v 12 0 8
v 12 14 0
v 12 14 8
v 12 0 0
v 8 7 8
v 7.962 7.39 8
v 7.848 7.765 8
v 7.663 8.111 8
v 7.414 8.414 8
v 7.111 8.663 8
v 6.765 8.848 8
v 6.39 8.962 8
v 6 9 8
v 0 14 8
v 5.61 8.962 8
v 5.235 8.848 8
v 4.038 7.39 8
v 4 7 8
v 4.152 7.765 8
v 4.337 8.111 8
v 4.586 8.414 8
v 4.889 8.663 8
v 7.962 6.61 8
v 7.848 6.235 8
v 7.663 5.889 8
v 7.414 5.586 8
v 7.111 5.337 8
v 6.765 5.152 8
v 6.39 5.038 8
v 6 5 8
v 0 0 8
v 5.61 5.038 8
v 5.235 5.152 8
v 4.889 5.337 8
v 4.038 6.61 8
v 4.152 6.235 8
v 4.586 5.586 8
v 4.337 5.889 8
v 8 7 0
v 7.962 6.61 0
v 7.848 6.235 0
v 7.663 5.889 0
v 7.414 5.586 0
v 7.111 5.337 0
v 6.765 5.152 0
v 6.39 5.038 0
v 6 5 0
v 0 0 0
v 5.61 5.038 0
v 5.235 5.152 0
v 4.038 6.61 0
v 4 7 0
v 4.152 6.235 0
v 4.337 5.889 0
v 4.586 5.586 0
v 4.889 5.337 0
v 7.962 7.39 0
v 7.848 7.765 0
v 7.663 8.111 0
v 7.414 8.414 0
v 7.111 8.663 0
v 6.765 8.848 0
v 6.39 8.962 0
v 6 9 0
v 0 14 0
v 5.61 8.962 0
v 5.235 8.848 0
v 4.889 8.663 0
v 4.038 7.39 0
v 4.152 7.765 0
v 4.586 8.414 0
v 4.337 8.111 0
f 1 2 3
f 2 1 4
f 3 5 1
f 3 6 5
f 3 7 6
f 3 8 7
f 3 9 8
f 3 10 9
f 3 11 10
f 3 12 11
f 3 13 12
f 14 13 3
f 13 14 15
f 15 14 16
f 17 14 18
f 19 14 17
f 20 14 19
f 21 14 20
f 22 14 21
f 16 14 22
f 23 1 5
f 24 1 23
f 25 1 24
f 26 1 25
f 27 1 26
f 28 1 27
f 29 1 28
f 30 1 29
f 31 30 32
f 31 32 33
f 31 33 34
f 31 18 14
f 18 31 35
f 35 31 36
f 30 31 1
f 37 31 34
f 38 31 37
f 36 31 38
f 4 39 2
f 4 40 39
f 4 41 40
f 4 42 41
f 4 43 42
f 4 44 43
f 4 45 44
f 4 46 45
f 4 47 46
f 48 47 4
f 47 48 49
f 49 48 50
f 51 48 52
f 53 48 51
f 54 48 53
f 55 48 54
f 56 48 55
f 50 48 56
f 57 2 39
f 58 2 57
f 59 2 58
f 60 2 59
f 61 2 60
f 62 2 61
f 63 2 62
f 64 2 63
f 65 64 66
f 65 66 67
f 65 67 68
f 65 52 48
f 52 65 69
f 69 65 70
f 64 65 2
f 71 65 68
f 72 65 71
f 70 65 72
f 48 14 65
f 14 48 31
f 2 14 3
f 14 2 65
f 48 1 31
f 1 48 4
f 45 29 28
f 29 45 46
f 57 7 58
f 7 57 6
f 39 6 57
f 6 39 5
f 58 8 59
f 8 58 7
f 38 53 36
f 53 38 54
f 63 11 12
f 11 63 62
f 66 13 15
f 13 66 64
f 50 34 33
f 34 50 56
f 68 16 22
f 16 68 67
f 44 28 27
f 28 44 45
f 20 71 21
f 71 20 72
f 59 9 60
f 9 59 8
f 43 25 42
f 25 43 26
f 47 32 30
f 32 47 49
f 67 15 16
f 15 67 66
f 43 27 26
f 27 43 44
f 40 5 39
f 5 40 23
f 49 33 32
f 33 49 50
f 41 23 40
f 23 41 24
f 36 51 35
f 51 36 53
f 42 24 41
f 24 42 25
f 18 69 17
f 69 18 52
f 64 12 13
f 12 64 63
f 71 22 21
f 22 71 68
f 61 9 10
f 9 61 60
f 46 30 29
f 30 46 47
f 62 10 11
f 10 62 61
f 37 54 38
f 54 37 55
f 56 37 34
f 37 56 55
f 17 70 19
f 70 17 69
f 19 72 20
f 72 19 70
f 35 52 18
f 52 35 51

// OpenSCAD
$fn = 32;

// ----------------------------------------------------------------------
// Micro pad: drilled pad, 5-20 mm class
// ----------------------------------------------------------------------

// --- parameters (mm) ---
pad_l = 12;               // pad length, X
pad_w = 14;               // pad width, Y
pad_t = 8;                // pad thickness, Z
hole_d = 4;               // through hole diameter

difference() {
  cube([pad_l, pad_w, pad_t]);
  translate([pad_l / 2, pad_w / 2, -1])
    cylinder(h = pad_t + 2, d = hole_d);
}
